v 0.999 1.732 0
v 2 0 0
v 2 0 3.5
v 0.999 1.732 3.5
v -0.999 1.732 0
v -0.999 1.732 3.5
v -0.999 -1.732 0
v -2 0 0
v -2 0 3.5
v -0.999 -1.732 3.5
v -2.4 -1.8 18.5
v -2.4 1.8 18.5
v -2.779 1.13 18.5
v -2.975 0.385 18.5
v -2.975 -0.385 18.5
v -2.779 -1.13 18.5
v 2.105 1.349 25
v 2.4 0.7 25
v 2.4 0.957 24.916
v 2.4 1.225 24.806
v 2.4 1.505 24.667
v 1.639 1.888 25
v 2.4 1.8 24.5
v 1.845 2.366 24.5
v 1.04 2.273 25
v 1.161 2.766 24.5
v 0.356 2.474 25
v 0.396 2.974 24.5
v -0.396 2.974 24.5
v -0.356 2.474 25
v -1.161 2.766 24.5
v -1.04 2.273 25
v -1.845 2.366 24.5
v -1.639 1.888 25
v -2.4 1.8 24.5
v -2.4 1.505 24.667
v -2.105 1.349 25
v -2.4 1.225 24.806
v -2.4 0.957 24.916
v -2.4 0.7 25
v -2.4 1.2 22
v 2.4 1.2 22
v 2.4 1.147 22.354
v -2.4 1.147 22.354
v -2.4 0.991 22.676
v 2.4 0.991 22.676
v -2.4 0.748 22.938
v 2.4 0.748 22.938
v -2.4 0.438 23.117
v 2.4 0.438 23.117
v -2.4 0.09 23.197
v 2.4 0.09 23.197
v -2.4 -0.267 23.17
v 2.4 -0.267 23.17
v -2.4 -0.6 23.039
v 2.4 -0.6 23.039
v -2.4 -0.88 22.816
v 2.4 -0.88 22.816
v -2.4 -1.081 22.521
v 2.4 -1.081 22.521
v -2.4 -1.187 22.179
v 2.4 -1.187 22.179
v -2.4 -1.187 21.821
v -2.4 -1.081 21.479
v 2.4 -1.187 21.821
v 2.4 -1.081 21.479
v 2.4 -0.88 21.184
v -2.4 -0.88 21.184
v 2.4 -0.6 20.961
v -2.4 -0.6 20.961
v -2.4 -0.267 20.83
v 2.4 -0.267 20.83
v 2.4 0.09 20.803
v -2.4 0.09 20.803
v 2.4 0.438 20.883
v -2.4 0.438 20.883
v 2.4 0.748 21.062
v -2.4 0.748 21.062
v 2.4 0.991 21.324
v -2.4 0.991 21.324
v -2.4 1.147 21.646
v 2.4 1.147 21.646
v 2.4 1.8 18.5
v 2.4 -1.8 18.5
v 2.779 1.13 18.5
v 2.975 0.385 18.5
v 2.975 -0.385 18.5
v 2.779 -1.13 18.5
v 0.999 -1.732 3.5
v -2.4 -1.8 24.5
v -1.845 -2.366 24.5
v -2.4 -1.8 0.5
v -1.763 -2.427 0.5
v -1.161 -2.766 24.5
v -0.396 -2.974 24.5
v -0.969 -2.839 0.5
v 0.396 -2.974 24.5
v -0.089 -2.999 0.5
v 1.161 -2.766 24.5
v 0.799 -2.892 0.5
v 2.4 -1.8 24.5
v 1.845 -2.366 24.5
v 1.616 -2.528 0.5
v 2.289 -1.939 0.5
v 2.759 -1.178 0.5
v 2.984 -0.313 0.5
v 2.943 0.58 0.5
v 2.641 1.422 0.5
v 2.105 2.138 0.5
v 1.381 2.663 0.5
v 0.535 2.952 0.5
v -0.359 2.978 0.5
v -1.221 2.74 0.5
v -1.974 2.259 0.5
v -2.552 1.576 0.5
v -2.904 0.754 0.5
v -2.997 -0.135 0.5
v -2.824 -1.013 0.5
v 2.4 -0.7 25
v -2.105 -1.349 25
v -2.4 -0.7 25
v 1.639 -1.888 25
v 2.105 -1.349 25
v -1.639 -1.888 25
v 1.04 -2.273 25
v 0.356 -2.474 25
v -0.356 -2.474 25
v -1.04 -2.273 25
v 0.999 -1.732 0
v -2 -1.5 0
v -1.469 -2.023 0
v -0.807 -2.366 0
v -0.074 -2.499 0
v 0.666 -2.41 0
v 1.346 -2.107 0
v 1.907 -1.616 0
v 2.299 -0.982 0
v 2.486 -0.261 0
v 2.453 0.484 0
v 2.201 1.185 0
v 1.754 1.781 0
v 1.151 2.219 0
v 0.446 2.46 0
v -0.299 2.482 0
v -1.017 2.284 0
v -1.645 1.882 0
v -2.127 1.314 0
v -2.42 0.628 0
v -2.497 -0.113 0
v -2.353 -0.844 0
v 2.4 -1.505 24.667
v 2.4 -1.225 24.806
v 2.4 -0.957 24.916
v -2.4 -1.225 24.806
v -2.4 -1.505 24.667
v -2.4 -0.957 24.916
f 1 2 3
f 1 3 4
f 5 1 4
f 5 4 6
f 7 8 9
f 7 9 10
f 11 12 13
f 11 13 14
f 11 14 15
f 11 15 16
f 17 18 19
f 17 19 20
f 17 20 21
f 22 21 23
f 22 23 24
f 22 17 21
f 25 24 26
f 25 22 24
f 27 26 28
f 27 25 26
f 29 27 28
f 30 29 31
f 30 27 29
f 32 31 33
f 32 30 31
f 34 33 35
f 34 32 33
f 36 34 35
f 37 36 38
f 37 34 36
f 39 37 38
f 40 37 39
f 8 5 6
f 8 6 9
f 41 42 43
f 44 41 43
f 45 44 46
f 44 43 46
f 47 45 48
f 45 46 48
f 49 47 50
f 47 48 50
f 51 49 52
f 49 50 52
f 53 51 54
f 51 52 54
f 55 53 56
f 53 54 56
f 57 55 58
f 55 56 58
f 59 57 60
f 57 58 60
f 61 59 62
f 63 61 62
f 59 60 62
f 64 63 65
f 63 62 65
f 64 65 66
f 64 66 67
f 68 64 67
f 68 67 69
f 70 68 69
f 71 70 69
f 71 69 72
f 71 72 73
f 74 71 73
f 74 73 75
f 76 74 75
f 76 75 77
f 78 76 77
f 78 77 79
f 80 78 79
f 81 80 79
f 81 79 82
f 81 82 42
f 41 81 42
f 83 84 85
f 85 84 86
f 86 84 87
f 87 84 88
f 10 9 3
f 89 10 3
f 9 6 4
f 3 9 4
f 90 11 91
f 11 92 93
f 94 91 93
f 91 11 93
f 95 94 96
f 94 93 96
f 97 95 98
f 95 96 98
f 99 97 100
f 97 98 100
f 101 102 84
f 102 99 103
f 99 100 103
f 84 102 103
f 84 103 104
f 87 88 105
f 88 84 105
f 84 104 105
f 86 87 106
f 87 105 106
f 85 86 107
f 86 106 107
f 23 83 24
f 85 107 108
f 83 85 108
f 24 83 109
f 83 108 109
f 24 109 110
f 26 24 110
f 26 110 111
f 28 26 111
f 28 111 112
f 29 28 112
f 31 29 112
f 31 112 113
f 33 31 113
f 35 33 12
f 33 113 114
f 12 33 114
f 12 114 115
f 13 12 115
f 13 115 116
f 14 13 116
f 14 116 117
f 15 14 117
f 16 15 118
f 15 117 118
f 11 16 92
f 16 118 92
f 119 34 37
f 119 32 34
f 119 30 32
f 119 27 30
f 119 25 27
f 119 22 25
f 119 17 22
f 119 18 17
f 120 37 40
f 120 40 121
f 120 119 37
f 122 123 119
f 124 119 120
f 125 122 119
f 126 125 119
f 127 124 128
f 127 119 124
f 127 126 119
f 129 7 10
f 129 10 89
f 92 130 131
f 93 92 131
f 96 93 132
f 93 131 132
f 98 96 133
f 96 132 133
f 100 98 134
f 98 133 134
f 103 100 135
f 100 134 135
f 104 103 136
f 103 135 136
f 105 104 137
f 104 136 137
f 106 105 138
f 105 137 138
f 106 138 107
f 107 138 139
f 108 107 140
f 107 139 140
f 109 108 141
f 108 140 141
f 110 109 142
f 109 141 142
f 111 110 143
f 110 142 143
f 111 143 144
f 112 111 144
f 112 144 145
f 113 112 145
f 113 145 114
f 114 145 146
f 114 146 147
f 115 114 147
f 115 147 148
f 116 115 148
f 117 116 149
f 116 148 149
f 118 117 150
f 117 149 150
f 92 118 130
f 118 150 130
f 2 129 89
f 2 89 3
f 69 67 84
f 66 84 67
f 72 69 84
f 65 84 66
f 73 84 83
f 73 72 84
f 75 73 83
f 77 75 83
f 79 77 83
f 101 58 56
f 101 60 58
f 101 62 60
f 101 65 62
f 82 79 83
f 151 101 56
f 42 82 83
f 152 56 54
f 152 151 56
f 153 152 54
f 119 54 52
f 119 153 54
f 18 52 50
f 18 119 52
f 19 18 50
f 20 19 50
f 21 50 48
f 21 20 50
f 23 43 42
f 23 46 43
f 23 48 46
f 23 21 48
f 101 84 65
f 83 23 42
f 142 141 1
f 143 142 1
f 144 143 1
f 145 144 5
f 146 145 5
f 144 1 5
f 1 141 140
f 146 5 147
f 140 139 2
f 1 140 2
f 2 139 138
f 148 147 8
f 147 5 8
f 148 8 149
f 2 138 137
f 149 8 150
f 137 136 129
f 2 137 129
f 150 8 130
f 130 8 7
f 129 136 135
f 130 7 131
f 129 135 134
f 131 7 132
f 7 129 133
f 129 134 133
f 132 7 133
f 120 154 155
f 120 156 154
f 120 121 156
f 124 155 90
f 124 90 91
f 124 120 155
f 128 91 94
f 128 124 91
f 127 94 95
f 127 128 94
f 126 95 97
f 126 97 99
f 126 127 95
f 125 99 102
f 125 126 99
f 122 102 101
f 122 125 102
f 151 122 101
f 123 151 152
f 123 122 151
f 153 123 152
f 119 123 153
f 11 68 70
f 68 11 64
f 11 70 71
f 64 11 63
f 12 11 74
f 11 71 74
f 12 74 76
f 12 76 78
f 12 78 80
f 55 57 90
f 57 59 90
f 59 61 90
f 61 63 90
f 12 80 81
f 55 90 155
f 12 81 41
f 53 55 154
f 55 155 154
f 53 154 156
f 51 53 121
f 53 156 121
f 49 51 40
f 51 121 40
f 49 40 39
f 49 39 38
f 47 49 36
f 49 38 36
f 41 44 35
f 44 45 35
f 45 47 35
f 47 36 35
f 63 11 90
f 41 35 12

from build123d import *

# Parameters (mm, degrees)
ESQUISSE1_R             = 3
BASE_EXTRUSION_DEPTH    = 25
CHANFREIN2_SIZE         = 0.5
ESQUISSE2_W             = 2
ESQUISSE2_H             = 6
ENL_V_MAT_EXTRU_1_DEPTH = 6.5
ESQUISSE5_W             = 2
ESQUISSE5_H             = 6
ENL_V_MAT_EXTRU_3_DEPTH = 6.5
ESQUISSE4_R             = 1.2
ENL_V_MAT_EXTRU_2_DEPTH = 26.751893134
ENL_V_MAT_EXTRU_4_DEPTH = 3.5


with BuildPart() as part:
    # Esquisse1 → Base-Extrusion (new body)
    with BuildSketch(Plane.XY):
        with Locations(Location((0, 0, 0), (0, 0, 216.869897646))):
            Circle(ESQUISSE1_R)
    extrude(amount=BASE_EXTRUSION_DEPTH)

    # Chanfrein2
    chanfrein2_edges = [part.edges().sort_by_distance(p)[0] for p in [
        (2.4, 1.8, 0),
        (2.4, 1.8, 25),
    ]]
    chamfer(chanfrein2_edges, length=CHANFREIN2_SIZE)

    # Esquisse2 → Enlèv. mat.-Extru.1 (cut)
    with BuildSketch(Plane.XY.offset(25)):
        with Locations((3.4, 0)):
            Rectangle(ESQUISSE2_W, ESQUISSE2_H)
    extrude(amount=-ENL_V_MAT_EXTRU_1_DEPTH, mode=Mode.SUBTRACT)

    # Esquisse5 → Enlèv. mat.-Extru.3 (cut)
    with BuildSketch(Plane.XY.offset(25)):
        with Locations((-3.4, 0)):
            Rectangle(ESQUISSE5_W, ESQUISSE5_H)
    extrude(amount=-ENL_V_MAT_EXTRU_3_DEPTH, mode=Mode.SUBTRACT)

    # Esquisse4 → Enlèv. mat.-Extru.2 (cut, through all)
    with BuildSketch(Plane(origin=(2.4, 0, 0), x_dir=(0, 0, -1), z_dir=(1, 0, 0))):
        with Locations(Location((-22, 0, 0), (0, 0, 90))):
            Circle(ESQUISSE4_R)
    extrude(amount=-ENL_V_MAT_EXTRU_2_DEPTH, mode=Mode.SUBTRACT)

    # Esquisse6 → Enlèv. mat.-Extru.4 (cut)
    with BuildSketch(Plane(origin=(0, 0, 0), x_dir=(-1, 0, 0), z_dir=(0, 0, -1))):
        Polygon((-2, 0), (-0.999257658, 1.732479187), (0.999257658, 1.732479187), (2, 0), (0.999257658, -1.732479187), (-0.999257658, -1.732479187), align=None)
    extrude(amount=-ENL_V_MAT_EXTRU_4_DEPTH, mode=Mode.SUBTRACT)


solid = part.part
